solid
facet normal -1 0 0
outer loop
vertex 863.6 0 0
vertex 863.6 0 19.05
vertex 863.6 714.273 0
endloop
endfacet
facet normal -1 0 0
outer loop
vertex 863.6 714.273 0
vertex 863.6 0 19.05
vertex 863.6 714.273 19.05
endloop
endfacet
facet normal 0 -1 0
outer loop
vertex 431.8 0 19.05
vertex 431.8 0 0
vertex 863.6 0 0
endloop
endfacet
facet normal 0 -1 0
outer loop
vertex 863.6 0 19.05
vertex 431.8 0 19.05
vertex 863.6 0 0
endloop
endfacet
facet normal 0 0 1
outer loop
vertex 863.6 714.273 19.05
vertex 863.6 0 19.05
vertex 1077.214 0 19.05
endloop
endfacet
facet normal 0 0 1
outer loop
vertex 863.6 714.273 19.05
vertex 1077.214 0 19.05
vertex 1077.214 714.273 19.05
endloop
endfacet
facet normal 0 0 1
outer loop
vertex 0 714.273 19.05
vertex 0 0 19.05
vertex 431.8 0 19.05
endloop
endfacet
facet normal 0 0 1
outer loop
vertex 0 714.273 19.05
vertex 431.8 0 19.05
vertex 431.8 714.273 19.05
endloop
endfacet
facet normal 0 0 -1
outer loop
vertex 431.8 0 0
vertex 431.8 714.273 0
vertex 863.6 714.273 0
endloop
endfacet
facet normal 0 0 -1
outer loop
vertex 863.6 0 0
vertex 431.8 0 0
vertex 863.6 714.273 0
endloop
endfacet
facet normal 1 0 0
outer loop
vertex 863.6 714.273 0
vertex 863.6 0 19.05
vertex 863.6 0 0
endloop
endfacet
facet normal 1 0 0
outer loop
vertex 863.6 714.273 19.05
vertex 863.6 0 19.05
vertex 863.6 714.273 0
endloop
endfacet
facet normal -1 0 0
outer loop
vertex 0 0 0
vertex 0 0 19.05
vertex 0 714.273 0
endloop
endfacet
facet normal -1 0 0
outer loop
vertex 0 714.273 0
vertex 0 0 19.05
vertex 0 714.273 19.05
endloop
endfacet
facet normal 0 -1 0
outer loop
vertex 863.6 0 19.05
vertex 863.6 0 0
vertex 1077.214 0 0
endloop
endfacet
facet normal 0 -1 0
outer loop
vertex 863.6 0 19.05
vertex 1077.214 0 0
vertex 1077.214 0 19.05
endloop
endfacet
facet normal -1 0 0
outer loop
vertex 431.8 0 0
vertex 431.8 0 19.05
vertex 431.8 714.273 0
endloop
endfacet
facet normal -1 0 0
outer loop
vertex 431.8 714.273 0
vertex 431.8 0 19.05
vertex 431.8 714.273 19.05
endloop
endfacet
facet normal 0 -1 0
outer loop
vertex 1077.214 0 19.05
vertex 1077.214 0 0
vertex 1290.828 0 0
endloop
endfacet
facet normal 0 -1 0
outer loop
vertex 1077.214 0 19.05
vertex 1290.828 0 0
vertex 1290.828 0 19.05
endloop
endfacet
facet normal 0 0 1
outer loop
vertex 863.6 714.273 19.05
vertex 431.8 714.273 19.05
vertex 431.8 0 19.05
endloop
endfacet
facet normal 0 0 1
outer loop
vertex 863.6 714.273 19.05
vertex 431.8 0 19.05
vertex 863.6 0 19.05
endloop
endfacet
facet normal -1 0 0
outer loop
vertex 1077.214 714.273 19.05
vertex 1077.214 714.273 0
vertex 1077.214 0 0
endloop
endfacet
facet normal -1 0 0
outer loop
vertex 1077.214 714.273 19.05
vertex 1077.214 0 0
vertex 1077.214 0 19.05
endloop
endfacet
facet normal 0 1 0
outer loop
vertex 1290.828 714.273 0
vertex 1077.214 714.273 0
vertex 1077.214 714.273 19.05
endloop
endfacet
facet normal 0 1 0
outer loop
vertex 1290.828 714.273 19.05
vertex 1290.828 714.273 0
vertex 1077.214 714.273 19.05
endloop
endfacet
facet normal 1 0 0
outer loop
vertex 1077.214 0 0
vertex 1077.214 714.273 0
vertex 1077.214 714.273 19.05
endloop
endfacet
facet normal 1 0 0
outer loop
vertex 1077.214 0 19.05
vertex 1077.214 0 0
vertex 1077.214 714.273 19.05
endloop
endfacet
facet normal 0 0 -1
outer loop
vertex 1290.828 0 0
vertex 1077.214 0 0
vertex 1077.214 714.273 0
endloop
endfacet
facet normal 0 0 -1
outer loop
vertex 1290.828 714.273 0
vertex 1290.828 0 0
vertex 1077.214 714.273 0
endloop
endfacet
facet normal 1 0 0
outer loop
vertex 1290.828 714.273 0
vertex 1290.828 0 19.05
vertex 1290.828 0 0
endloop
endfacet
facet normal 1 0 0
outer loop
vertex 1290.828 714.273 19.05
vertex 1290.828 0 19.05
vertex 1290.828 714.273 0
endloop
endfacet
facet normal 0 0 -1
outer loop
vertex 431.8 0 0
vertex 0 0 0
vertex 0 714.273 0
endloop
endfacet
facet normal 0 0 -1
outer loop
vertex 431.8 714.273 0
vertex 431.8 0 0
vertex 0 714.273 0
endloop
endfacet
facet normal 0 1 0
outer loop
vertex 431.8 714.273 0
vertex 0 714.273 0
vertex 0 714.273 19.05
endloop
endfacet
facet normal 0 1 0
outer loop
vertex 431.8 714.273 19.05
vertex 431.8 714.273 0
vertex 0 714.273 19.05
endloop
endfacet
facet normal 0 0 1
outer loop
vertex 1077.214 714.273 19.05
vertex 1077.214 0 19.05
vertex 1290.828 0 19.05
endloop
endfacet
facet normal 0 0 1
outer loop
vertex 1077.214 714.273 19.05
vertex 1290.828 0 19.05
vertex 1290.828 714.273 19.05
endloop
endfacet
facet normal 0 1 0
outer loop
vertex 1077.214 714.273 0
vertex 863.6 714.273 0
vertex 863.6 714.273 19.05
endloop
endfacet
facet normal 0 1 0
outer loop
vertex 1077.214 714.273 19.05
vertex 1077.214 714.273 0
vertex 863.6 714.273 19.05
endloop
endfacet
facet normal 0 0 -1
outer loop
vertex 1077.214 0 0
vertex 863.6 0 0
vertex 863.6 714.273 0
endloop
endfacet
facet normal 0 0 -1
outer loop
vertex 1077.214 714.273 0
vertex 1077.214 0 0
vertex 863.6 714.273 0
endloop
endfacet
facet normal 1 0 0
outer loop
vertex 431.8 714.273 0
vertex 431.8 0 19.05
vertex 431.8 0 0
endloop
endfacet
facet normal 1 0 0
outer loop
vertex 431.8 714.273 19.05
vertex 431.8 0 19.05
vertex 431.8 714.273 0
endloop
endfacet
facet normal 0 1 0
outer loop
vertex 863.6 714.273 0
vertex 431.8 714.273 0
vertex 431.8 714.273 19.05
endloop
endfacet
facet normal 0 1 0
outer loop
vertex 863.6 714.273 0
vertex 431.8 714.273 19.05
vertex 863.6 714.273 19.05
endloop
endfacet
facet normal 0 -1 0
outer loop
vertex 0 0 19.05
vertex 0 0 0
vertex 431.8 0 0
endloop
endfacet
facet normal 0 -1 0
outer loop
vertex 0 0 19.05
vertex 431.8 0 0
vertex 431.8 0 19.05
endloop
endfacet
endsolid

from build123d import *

# Parameters (mm, degrees)
SKETCH1_W           = 1290.828
SKETCH1_H           = 714.2734
BOSS_EXTRUDE1_DEPTH = 19.05
SPLIT3_OUTLINE_W    = 714.2734
SPLIT3_OUTLINE_H    = 19.05
SPLIT3_DEPTH        = 431.8
SPLIT3_2_OUTLINE_W  = 714.2734
SPLIT3_2_OUTLINE_H  = 19.05
SPLIT3_2_DEPTH      = 431.8
SPLIT3_START        = 863.6
SPLIT3_3_OUTLINE_W  = 714.2734
SPLIT3_3_OUTLINE_H  = 19.05
SPLIT3_3_DEPTH      = 427.228
SPLIT3_4_OUTLINE_W  = 714.2734
SPLIT3_4_OUTLINE_H  = 19.05
SPLIT3_4_DEPTH      = 427.228


# Read off the part's stored shape, not the designer's step: Split3
with BuildPart() as part:
    # Sketch1 → Boss-Extrude1 (new body)
    with BuildSketch(Plane.XY):
        with Locations((645.414, 357.1367)):
            Rectangle(SKETCH1_W, SKETCH1_H)
    extrude(amount=BOSS_EXTRUDE1_DEPTH)

    # Split3 2 outline → Split3 2 (cut)
    with BuildSketch(Plane.YZ):
        with Locations((357.1367, 9.525)):
            Rectangle(SPLIT3_2_OUTLINE_W, SPLIT3_2_OUTLINE_H)
    extrude(amount=SPLIT3_2_DEPTH, mode=Mode.SUBTRACT)

    # Split3 3 outline → Split3 3 (cut)
    with BuildSketch(Plane.YZ.offset(SPLIT3_START)):
        with Locations((357.1367, 9.525)):
            Rectangle(SPLIT3_3_OUTLINE_W, SPLIT3_3_OUTLINE_H)
    extrude(amount=SPLIT3_3_DEPTH, mode=Mode.SUBTRACT)


with BuildPart() as body_2:
    # Split3 outline → Split3 (new body)
    with BuildSketch(Plane.YZ):
        with Locations((357.1367, 9.525)):
            Rectangle(SPLIT3_OUTLINE_W, SPLIT3_OUTLINE_H)
    extrude(amount=SPLIT3_DEPTH)


with BuildPart() as body_3:
    # Split3 4 outline → Split3 4 (new body)
    with BuildSketch(Plane.YZ.offset(SPLIT3_START)):
        with Locations((357.1367, 9.525)):
            Rectangle(SPLIT3_4_OUTLINE_W, SPLIT3_4_OUTLINE_H)
    extrude(amount=SPLIT3_4_DEPTH)


with BuildPart() as body_4:
    # Split4: the piece on the far side of the plane
    add(body_3.part)
    split(bisect_by=Plane(origin=(1077.214, 0, 0), x_dir=(0, 0, 1), z_dir=(1, 0, 0)), keep=Keep.BOTTOM)


with BuildPart() as body_3_1:
    add(body_3.part)

    # Split4
    split(bisect_by=Plane(origin=(1077.214, 0, 0), x_dir=(0, 0, 1), z_dir=(1, 0, 0)), keep=Keep.TOP)


solid = Compound([part.part, body_2.part, body_4.part, body_3_1.part])
